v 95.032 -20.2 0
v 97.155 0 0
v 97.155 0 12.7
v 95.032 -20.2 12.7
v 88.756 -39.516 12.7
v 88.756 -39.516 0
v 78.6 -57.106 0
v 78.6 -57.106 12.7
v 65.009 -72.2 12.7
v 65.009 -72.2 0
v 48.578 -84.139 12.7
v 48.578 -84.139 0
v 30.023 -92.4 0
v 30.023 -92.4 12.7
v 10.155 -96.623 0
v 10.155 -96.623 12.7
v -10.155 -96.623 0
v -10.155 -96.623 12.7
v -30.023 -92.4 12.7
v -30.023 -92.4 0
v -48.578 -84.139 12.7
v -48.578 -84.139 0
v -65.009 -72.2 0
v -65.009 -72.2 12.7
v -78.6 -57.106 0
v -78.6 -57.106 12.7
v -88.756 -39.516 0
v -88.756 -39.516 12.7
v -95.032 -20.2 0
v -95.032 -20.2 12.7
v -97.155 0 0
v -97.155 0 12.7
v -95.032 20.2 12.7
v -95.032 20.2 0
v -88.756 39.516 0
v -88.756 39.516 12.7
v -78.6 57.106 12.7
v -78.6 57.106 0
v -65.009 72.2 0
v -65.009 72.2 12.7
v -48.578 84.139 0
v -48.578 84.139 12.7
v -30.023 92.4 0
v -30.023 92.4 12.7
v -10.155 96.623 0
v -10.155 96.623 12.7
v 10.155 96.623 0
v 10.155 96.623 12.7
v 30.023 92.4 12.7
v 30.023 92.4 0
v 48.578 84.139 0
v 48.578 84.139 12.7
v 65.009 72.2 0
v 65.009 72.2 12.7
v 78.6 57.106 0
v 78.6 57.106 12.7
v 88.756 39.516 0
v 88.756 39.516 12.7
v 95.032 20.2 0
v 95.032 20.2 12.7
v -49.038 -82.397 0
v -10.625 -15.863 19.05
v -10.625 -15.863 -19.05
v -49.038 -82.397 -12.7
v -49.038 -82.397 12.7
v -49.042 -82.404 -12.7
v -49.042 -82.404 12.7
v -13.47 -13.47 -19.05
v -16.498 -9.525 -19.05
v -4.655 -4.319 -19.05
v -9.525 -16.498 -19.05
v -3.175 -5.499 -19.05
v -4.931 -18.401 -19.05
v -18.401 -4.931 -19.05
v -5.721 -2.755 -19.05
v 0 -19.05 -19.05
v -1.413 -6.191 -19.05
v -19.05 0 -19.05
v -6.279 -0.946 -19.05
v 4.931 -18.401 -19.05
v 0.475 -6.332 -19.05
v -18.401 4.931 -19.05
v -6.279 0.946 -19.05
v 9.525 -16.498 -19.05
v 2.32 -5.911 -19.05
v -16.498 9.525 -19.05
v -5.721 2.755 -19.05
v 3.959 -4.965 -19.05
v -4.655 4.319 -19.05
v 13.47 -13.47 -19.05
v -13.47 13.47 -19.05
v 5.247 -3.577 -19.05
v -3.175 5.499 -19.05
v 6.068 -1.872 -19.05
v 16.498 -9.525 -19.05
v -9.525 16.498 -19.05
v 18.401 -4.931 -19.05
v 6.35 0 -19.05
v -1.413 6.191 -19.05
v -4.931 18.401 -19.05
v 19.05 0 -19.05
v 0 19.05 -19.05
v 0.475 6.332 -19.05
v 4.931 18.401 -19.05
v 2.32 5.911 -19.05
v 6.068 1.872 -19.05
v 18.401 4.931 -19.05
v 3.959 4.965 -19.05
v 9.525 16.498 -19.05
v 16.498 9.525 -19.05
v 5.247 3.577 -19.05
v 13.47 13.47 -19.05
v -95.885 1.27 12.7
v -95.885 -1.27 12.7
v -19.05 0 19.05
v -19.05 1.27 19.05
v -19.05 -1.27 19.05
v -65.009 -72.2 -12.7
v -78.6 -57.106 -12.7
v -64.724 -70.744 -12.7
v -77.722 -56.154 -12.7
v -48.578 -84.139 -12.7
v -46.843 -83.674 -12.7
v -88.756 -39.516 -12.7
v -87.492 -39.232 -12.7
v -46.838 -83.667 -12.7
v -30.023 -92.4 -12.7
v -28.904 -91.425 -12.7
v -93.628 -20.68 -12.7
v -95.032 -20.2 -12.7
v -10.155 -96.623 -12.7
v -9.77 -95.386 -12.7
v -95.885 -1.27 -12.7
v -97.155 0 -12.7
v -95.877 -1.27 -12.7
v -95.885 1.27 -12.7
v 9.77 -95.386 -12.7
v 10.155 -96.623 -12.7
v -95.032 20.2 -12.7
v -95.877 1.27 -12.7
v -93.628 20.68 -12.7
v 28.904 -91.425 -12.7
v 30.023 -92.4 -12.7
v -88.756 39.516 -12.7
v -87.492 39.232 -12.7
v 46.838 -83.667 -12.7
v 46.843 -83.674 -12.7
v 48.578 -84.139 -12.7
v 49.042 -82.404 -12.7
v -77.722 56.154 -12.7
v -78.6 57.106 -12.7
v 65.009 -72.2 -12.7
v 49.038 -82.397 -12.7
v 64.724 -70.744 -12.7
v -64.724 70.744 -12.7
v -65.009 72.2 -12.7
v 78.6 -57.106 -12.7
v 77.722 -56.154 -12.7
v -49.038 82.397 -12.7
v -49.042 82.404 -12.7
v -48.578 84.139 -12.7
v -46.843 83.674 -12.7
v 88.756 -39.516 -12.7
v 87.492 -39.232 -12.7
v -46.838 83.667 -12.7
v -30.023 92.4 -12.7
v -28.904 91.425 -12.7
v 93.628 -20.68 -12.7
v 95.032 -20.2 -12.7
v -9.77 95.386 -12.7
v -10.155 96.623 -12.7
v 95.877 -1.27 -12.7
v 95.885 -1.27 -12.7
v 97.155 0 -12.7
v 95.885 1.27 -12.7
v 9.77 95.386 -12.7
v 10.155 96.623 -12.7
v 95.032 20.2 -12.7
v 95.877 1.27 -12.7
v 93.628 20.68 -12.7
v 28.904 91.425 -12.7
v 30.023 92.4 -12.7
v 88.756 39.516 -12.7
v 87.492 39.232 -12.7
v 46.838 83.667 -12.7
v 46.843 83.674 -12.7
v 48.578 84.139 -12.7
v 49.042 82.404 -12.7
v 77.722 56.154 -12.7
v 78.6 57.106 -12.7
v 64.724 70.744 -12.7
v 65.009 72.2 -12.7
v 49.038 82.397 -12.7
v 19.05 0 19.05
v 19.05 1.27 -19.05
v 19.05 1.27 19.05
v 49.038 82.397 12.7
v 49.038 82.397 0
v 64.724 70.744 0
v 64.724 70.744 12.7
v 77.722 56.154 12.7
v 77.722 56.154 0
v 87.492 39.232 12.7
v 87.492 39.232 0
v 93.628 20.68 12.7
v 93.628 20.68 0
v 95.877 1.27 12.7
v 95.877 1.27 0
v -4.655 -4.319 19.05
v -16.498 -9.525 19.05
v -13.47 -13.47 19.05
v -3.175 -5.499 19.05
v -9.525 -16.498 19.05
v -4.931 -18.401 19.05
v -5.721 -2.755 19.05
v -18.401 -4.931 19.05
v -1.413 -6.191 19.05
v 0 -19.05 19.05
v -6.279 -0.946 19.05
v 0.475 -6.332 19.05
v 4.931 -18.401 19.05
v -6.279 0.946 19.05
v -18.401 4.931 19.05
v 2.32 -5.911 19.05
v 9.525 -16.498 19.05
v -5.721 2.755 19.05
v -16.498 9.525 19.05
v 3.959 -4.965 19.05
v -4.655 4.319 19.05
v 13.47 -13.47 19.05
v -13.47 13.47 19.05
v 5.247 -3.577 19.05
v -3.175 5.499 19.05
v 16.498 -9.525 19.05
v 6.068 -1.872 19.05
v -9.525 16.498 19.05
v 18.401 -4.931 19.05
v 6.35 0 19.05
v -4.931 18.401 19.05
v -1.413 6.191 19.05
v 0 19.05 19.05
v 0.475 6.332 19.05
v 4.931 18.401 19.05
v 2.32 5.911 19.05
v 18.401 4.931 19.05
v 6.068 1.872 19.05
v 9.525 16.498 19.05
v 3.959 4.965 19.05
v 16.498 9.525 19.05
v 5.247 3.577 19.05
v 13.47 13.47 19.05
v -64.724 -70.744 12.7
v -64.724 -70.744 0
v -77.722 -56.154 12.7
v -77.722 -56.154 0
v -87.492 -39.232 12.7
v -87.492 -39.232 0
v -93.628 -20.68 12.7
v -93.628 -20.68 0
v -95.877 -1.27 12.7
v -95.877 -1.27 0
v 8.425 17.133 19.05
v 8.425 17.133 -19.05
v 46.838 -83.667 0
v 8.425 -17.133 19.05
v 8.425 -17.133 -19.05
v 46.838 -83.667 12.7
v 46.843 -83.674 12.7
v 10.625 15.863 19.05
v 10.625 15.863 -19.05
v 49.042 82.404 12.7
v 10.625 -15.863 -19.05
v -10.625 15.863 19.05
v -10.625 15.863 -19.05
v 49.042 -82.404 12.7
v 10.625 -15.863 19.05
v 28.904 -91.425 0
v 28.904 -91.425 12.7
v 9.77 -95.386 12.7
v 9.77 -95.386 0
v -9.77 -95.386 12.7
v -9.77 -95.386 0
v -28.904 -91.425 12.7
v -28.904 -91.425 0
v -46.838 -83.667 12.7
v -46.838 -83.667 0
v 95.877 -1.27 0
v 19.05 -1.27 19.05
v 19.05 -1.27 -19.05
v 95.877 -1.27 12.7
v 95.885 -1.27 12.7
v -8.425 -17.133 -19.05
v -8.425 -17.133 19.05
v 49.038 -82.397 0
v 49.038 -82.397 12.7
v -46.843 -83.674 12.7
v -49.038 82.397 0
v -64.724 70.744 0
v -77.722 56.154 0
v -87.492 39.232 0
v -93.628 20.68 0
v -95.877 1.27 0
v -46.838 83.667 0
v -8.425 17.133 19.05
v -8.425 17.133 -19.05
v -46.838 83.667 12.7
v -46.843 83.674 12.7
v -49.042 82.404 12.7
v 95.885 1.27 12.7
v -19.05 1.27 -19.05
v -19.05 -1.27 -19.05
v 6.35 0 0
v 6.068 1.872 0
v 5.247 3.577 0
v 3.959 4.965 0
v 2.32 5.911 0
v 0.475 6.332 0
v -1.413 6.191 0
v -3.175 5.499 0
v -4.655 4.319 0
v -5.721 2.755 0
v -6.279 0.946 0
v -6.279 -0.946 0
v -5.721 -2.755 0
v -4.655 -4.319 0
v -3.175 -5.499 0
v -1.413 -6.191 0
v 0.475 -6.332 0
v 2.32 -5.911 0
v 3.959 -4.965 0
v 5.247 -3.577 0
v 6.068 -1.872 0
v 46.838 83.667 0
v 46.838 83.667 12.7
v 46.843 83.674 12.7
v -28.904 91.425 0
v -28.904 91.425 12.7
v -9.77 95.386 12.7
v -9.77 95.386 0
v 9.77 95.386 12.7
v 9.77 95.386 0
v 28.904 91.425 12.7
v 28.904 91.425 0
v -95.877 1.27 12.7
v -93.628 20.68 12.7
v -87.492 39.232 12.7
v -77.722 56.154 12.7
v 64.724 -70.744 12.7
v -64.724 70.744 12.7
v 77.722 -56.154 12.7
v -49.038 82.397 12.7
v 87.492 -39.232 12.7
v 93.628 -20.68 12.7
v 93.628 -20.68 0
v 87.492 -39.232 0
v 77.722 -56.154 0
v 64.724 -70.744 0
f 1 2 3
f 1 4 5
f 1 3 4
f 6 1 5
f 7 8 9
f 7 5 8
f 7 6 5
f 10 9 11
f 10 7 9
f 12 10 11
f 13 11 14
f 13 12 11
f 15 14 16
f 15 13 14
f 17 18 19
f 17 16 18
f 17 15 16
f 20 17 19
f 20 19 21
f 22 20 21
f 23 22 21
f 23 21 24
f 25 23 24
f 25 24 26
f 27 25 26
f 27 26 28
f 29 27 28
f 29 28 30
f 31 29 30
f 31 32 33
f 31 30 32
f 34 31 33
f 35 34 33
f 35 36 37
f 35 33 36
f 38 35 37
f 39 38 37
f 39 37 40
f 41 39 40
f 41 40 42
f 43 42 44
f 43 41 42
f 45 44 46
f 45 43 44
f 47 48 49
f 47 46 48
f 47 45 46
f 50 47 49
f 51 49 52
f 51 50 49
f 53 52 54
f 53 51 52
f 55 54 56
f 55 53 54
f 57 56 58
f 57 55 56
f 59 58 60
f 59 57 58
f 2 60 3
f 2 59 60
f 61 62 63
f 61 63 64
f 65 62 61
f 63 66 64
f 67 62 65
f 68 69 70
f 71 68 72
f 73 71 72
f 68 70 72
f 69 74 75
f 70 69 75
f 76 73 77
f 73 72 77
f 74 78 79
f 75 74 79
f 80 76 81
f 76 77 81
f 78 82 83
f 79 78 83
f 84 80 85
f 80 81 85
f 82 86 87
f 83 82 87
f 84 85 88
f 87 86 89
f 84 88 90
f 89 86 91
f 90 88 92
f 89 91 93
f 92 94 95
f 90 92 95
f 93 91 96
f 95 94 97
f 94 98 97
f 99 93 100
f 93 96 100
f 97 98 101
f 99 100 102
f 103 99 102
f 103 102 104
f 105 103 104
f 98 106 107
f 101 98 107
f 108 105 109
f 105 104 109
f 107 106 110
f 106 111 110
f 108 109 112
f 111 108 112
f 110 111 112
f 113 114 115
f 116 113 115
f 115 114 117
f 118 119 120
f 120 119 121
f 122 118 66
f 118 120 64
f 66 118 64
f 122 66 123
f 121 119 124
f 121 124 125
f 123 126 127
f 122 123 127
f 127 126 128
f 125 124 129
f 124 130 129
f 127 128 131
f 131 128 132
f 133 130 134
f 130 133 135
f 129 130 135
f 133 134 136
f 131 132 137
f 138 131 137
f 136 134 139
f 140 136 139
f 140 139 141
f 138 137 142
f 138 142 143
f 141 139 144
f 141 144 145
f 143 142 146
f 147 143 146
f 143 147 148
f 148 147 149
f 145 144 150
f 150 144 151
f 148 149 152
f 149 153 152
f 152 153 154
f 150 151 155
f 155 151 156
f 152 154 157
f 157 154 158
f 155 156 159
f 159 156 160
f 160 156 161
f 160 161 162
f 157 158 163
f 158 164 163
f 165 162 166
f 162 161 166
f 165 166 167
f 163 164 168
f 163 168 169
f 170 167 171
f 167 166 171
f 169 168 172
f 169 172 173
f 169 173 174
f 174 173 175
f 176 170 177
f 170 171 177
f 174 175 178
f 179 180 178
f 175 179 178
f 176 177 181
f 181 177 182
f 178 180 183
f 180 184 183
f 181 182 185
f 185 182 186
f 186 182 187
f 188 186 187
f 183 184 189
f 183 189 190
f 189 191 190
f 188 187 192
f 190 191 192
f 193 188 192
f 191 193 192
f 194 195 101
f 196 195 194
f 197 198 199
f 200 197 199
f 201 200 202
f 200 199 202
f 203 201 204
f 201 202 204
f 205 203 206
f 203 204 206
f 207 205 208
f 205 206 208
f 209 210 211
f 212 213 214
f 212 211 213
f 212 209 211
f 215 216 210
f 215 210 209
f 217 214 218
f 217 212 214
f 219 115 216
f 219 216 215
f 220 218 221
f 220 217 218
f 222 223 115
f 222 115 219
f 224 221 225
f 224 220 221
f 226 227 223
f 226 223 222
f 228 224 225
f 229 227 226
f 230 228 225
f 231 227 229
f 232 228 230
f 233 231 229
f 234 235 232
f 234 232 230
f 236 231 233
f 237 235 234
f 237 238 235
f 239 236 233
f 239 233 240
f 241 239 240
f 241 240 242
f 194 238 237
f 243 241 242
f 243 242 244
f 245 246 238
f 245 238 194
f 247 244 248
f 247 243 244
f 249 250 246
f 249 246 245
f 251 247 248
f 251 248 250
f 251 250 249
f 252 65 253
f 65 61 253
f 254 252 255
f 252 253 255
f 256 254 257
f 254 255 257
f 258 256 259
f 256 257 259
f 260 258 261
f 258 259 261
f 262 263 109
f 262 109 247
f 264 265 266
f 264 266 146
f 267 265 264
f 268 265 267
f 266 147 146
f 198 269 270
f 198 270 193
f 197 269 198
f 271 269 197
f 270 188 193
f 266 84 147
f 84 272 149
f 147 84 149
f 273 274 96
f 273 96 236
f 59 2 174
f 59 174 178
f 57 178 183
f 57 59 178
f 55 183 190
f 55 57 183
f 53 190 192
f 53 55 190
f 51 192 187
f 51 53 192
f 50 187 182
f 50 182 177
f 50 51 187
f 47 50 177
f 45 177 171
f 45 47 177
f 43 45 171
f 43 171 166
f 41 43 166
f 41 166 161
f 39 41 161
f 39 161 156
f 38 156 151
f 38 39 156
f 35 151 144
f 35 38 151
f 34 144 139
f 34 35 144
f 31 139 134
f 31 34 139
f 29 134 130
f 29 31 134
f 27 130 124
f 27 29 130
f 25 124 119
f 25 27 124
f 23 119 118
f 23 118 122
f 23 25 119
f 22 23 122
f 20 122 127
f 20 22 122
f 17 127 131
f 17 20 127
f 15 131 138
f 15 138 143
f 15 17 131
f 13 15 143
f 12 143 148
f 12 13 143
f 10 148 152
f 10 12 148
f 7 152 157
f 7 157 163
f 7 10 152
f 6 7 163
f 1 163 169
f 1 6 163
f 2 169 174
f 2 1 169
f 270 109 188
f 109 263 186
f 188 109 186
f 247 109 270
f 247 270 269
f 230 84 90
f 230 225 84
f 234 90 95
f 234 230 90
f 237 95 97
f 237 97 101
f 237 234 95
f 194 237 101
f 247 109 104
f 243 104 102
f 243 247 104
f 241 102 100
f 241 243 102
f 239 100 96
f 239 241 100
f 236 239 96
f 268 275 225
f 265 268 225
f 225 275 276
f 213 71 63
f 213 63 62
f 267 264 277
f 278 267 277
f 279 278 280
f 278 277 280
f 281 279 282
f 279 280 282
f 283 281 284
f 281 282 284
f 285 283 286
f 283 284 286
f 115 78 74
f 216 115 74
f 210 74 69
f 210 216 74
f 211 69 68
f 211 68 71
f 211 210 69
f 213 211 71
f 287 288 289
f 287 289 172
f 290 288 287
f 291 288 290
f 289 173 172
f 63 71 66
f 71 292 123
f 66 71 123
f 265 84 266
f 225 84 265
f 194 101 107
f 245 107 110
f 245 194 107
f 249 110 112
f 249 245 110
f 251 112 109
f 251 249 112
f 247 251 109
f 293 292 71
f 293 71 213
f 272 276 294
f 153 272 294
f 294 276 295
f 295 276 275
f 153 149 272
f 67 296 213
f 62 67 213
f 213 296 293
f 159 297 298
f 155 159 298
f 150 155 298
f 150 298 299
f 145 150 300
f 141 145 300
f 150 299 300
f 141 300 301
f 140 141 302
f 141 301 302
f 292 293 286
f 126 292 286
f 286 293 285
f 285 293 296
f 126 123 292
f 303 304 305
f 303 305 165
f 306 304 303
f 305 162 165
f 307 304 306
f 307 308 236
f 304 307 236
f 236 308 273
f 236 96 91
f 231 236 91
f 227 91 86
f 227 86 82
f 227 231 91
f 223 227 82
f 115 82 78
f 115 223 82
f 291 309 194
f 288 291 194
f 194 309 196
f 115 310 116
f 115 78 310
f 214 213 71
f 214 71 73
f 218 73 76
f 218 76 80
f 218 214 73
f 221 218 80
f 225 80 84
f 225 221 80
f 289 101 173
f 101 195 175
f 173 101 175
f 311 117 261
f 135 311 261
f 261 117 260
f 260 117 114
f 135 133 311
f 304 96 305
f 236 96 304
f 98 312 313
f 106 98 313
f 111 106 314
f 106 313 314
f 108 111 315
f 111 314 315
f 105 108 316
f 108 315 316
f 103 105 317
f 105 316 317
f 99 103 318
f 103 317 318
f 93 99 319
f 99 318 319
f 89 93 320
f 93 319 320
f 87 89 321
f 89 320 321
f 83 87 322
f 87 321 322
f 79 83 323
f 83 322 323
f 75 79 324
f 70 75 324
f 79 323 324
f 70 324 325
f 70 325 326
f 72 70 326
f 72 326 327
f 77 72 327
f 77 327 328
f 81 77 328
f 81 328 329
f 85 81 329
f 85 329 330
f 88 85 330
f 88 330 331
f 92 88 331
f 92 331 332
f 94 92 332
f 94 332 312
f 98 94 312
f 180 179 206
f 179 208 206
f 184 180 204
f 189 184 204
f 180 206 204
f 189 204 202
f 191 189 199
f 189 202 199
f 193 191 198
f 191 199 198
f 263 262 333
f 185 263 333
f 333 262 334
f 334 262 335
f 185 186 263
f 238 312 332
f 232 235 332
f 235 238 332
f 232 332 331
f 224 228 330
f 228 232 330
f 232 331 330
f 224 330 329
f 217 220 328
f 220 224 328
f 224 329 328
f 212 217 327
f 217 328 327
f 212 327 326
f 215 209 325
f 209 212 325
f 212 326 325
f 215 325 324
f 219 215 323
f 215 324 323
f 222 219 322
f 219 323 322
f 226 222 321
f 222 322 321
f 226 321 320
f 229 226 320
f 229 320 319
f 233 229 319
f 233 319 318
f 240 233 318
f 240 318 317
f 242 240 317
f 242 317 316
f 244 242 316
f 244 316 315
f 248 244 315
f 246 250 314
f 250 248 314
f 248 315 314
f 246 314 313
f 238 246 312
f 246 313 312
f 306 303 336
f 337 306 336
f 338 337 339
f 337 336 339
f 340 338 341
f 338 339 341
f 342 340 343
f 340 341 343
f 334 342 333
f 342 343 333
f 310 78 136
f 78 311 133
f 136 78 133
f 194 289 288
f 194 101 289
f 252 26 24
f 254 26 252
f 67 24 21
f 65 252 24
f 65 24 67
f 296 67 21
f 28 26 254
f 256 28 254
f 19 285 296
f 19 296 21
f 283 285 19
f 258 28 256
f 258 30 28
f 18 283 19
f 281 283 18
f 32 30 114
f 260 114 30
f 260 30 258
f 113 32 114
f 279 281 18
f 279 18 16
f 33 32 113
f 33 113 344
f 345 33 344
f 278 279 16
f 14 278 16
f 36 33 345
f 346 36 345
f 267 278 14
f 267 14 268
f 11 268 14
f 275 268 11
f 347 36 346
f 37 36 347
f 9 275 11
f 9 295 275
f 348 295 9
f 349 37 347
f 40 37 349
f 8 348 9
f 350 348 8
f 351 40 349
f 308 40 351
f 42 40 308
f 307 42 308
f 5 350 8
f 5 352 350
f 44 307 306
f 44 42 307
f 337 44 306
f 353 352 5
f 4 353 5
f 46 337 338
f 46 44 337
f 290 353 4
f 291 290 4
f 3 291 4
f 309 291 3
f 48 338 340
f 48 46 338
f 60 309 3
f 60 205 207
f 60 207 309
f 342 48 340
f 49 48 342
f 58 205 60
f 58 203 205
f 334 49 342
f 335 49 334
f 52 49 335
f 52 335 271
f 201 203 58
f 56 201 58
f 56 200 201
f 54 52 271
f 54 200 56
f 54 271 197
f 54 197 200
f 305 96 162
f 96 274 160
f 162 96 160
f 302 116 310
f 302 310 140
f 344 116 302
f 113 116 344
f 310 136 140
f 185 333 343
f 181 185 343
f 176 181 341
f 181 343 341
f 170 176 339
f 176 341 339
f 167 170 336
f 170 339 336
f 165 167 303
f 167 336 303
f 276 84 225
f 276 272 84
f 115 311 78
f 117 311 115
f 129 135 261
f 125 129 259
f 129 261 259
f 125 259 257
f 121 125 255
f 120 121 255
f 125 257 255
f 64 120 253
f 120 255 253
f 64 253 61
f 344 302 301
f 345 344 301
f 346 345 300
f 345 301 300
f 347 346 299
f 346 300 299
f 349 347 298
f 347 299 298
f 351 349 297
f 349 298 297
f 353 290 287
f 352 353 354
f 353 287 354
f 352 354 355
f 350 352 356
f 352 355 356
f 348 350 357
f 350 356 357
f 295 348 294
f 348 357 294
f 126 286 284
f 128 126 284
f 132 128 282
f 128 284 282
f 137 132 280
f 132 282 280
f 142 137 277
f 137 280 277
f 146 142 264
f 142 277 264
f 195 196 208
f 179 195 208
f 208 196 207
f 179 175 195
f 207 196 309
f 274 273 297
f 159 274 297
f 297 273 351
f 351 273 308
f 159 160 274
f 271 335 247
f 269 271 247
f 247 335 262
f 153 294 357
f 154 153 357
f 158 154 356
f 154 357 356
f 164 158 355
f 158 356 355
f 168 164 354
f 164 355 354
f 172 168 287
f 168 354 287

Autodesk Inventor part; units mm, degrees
ref_plane "YZ Plane" through (0, 0, 0) normal (1, 0, 0) x (0, 1, 0)
ref_plane "XZ Plane" through (0, 0, 0) normal (0, 1, 0) x (-1, 0, 0)
ref_plane "XY Plane" through (0, 0, 0) normal (0, 0, 1) x (1, 0, 0)
sketch "Sketch1" plane through (0, 0, 0) normal (0, 0, 1) x (1, 0, 0)
  circle A0 centre (0, 0) radius 97.155
  circle A1 centre (0, 0) radius 95.885
  dimension "d0" = 194.31
  dimension "d1" = 191.77
extrude "Extrusion1" add sketch "Sketch1" along normal mid plane 25.4
sketch "Sketch2" plane through (0, 0, 0) normal (0, 0, 1) x (1, 0, 0)
  circle A0 centre (0, 0) radius 19.05
  circle A1 centre (0, 0) radius 6.35
  dimension "d4" = 38.1
  dimension "d5" = 12.7
extrude "Extrusion2" add sketch "Sketch2" along normal mid plane 38.1
sketch "Sketch3" plane through (0, 0, 0) normal (0, 1, 0) x (-1, 0, 0)
  line L0 (95.885, -12.7) -> (-95.885, -12.7) projected
  line L1 (-95.885, 12.7) -> (95.885, 12.7) projected
  line L2 (19.05, -19.05) -> (19.05, 19.05) projected
  line L3 (19.05, 19.05) -> (19.05, -19.05)
  line L4 (19.05, -19.05) -> (95.885, -12.7)
  line L5 (95.885, -12.7) -> (95.885, 12.7)
  line L6 (95.885, 12.7) -> (19.05, 19.05)
extrude "Extrusion3" add sketch "Sketch3" along normal mid plane 2.54
pattern_circular "Circular Pattern1" count 6 over 360 about axis through (0, 0, 19.05) along (0, 0, -1) of "Extrusion3"
properties part number "Wheel_Spokes"
